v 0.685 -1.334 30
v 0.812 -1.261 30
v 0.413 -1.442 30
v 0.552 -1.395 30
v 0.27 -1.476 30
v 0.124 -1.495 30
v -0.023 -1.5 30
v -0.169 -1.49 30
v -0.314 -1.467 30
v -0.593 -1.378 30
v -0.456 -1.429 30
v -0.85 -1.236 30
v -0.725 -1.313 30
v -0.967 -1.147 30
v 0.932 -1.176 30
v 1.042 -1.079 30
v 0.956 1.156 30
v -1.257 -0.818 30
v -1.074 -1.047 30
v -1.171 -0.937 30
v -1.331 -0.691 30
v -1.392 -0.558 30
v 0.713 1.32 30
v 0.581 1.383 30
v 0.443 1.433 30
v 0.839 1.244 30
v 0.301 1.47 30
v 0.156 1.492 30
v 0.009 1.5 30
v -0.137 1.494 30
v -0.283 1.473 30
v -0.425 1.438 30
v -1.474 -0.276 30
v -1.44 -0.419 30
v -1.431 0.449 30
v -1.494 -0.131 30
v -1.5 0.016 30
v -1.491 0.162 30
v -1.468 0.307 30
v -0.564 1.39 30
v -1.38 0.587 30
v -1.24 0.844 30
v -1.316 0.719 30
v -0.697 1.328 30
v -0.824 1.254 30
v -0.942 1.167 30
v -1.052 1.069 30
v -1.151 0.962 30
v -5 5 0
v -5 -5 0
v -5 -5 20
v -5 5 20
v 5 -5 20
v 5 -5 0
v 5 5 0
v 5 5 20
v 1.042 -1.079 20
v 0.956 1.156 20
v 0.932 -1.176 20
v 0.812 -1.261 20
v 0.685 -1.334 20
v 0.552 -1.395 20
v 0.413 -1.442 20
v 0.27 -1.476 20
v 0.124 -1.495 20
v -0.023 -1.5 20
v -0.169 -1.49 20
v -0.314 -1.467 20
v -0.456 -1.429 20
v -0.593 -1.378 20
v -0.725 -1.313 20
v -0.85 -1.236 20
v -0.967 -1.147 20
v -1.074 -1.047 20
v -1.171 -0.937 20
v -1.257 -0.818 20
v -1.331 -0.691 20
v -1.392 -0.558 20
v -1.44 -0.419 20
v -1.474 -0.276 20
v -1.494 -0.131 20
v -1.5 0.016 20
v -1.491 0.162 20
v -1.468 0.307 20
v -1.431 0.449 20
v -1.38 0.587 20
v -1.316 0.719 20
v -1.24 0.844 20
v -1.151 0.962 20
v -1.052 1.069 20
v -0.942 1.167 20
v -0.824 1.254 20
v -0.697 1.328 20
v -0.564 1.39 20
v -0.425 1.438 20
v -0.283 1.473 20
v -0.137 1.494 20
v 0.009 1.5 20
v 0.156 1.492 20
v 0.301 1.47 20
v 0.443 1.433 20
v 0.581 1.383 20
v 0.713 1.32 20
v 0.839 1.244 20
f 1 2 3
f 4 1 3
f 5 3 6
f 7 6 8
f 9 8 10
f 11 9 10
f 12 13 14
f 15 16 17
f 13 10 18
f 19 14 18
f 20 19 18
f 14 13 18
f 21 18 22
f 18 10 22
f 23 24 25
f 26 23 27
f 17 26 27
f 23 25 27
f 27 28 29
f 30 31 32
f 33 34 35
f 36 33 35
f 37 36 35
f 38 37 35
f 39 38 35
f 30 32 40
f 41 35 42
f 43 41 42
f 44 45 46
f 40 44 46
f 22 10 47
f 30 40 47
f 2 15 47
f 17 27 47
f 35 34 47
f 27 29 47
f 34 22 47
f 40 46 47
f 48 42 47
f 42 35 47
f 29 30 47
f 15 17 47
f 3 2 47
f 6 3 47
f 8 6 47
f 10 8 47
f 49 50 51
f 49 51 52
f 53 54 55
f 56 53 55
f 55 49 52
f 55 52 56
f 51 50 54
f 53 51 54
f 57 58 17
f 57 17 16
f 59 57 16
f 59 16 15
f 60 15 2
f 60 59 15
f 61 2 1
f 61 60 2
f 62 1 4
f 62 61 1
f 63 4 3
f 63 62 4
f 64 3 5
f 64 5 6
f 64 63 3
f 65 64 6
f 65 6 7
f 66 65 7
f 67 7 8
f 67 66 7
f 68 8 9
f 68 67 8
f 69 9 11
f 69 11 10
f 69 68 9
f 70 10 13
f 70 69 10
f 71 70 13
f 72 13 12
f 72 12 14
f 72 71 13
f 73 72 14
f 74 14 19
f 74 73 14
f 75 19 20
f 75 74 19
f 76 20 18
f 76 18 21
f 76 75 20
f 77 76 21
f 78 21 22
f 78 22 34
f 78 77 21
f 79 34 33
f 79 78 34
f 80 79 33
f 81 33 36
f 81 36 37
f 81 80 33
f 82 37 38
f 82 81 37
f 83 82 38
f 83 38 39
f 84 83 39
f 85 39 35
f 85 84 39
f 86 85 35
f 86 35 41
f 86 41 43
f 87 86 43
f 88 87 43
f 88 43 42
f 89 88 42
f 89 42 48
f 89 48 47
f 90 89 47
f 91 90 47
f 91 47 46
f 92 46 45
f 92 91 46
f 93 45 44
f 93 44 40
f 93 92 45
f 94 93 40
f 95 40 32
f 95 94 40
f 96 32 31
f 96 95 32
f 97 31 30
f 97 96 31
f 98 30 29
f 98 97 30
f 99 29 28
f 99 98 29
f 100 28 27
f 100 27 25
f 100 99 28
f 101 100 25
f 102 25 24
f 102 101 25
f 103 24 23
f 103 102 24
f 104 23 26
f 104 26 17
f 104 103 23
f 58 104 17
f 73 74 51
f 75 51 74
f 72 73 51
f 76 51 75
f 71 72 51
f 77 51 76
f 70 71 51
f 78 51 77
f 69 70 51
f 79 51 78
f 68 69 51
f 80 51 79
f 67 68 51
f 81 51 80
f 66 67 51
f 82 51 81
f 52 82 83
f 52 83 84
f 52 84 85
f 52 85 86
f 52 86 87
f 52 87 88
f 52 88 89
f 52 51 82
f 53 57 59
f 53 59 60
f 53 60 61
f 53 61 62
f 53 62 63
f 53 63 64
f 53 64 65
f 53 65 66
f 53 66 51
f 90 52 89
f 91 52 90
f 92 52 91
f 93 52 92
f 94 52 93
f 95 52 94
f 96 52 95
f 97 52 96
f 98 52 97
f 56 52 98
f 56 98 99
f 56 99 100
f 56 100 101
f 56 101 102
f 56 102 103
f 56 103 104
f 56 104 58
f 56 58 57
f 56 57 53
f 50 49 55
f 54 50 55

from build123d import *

# Parameters (mm, degrees)
SKETCH1_W           = 10
SKETCH1_H           = 10
BOSS_EXTRUDE1_DEPTH = 20
BOSS_EXTRUDE2_DEPTH = 10


with BuildPart() as part:
    # Sketch1 → Boss-Extrude1 (new body)
    with BuildSketch(Plane.XY):
        Rectangle(SKETCH1_W, SKETCH1_H)
    extrude(amount=BOSS_EXTRUDE1_DEPTH)

    # Sketch2 → Boss-Extrude2 (add)
    with BuildSketch(Plane.XY.offset(20)):
        with BuildLine():
            Line((0.956391162, 1.155558716), (1.0421378, -1.078864591))
            ThreePointArc((1.0421378, -1.078864591), (-1.498896721, -0.057520593), (0.956391162, 1.155558716))
        make_face()
    extrude(amount=BOSS_EXTRUDE2_DEPTH)


solid = part.part
